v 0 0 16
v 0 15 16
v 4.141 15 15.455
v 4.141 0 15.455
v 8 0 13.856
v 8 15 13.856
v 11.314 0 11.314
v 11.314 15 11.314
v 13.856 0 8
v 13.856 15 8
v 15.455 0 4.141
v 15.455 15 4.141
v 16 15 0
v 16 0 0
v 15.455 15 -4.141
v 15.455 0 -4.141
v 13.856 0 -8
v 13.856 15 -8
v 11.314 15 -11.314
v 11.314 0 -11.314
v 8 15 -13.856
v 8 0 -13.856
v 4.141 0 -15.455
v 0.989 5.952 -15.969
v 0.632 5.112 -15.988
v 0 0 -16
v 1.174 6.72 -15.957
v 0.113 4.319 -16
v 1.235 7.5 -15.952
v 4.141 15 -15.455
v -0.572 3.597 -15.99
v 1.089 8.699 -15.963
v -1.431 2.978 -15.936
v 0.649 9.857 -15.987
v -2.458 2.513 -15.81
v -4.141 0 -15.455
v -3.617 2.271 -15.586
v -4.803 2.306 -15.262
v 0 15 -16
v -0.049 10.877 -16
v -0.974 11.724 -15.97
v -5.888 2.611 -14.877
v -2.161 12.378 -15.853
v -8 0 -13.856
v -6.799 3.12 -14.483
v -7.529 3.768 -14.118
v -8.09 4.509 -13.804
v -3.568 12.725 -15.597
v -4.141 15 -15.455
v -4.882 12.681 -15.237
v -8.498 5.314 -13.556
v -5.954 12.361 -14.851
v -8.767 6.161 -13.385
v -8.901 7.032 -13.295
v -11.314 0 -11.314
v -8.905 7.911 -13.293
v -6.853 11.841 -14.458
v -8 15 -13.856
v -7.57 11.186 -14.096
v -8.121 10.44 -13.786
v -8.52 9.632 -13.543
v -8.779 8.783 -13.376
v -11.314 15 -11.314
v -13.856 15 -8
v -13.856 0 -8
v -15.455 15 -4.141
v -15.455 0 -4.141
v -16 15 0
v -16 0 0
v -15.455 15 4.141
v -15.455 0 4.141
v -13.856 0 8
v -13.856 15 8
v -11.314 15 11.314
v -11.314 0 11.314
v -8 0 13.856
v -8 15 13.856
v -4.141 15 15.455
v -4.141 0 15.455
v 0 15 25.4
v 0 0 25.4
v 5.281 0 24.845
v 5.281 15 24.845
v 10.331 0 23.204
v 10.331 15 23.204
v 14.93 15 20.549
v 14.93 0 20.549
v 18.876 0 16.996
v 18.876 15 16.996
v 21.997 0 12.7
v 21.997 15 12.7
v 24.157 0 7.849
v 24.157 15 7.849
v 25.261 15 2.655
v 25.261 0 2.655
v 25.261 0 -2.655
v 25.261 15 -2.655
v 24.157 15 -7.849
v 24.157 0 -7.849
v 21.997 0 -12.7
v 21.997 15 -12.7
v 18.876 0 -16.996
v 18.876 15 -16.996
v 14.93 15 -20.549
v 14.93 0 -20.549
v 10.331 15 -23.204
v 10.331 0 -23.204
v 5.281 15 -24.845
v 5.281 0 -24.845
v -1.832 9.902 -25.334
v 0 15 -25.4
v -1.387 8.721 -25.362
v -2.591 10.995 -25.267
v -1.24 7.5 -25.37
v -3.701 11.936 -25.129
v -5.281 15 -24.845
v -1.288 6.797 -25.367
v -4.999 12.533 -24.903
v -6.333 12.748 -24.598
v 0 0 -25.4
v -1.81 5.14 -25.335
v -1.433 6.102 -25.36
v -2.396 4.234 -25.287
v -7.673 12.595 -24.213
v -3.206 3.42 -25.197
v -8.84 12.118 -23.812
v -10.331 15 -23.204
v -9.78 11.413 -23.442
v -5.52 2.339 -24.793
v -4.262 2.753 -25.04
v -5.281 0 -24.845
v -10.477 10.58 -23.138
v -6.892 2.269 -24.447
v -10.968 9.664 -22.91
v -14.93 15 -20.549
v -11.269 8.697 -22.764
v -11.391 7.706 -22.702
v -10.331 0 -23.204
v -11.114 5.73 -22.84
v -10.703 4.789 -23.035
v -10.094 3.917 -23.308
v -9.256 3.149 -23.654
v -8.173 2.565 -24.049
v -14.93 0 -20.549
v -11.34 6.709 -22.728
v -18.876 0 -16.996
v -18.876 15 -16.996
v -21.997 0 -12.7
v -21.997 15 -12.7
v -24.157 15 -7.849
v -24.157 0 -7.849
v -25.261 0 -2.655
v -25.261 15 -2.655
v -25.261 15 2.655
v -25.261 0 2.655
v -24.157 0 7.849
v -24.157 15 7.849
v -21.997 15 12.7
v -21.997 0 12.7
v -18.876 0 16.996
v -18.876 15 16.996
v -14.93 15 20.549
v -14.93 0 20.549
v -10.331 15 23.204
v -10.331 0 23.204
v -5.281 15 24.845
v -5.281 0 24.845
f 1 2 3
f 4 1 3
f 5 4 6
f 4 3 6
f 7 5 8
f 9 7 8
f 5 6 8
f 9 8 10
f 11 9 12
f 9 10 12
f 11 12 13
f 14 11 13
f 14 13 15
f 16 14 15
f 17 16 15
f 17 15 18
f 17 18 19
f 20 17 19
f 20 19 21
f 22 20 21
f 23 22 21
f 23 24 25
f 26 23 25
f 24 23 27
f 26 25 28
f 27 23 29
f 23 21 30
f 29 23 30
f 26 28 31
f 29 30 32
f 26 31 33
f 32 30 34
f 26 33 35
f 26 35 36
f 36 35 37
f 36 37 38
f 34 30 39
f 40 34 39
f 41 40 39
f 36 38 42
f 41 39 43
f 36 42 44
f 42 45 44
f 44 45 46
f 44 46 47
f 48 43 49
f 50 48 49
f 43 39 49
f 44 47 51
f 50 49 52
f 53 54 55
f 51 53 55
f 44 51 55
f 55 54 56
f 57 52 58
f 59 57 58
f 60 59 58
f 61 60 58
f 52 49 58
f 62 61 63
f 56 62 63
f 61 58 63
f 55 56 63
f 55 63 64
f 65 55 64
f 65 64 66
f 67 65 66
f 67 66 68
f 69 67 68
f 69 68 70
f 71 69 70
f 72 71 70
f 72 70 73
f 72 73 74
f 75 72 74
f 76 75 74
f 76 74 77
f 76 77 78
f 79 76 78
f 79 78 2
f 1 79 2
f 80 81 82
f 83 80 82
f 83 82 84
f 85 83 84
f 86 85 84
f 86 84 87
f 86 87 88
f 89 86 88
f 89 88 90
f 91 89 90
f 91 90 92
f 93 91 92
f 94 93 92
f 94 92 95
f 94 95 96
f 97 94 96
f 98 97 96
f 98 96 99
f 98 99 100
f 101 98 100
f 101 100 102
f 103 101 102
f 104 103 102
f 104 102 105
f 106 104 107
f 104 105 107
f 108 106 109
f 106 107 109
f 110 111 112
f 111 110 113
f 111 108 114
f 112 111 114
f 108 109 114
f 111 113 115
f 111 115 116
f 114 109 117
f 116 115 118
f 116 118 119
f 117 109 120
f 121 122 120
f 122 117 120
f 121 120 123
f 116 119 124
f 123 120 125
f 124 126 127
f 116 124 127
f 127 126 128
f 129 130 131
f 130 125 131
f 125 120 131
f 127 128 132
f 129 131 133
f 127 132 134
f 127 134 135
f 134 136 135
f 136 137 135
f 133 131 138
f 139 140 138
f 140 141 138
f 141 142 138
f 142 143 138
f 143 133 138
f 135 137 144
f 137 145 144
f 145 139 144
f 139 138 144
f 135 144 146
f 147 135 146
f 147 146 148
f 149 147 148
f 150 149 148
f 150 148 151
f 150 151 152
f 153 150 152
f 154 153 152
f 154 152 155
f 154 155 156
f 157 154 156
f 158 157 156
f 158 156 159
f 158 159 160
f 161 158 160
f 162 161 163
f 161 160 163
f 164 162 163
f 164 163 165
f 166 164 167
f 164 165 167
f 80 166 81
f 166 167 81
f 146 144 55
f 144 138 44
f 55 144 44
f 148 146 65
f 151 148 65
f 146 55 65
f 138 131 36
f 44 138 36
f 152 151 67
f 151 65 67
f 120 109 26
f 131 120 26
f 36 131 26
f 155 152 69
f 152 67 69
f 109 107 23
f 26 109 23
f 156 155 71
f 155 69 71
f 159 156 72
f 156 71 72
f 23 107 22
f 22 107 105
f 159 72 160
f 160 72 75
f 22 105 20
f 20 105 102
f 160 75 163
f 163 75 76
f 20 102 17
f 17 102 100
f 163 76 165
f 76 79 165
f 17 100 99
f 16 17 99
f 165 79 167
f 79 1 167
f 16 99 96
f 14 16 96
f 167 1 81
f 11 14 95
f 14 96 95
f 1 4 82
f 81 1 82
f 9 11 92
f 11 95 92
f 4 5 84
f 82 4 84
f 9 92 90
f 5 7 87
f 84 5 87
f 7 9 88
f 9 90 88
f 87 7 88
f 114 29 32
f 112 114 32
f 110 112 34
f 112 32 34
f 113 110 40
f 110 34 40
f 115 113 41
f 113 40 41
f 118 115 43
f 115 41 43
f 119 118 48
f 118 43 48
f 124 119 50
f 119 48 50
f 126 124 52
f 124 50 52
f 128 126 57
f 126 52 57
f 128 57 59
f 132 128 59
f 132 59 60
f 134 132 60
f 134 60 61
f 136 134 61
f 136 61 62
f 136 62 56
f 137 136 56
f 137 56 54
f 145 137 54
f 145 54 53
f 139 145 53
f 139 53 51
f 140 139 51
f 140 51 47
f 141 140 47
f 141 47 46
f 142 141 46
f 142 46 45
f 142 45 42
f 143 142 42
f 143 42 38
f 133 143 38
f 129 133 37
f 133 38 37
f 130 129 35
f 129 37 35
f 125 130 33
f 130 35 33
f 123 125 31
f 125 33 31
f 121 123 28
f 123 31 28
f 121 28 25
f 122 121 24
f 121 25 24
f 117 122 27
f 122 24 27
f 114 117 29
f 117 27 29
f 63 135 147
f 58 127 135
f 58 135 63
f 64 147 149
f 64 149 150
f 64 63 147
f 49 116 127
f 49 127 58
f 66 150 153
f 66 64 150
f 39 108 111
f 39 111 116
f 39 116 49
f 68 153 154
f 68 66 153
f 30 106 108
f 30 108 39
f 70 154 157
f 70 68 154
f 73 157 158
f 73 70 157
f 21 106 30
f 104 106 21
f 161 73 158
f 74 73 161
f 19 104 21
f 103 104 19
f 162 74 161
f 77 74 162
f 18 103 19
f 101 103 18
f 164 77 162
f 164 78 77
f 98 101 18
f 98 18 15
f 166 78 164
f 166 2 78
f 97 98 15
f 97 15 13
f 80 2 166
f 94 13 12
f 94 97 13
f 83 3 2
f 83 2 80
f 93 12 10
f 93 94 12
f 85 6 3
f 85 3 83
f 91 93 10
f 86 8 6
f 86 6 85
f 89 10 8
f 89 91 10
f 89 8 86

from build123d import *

# Parameters (mm, degrees)
SKETCH1_R                        = 25.4
BOSS_EXTRUDE1_DEPTH              = 15
SKETCH2_R                        = 16
CUT_EXTRUDE1_DEPTH               = 15
F_10_5_10_5_DIAMETER_HOLE1_D     = 10.5
F_10_5_10_5_DIAMETER_HOLE1_DEPTH = 30
F_10_5_10_5_DIAMETER_HOLE1_TIP   = 3.15451825


with BuildPart() as part:
    # Sketch1 → Boss-Extrude1 (new body)
    with BuildSketch(Plane(origin=(0, 0, 0), x_dir=(1, 0, 0), z_dir=(0, 1, 0))):
        with Locations(Location((0, 0, 0), (0, 0, 270))):
            Circle(SKETCH1_R)
    extrude(amount=BOSS_EXTRUDE1_DEPTH)

    # Sketch2 → Cut-Extrude1 (cut)
    with BuildSketch(Plane(origin=(0, 15, 0), x_dir=(1, 0, 0), z_dir=(0, 1, 0))):
        with Locations(Location((0, 0, 0), (0, 0, 270))):
            Circle(SKETCH2_R)
    extrude(amount=-CUT_EXTRUDE1_DEPTH, mode=Mode.SUBTRACT)

    # Ø10.5 (10.5) Diameter Hole1
    with Locations(Plane(origin=(-6.456859903, 7.5, -24.565605228), x_dir=(-0.967149812109, 0, 0.254207082784), z_dir=(-0.254207082784, 0, -0.967149812109))):
        with Locations((0, 0)):
            Hole(F_10_5_10_5_DIAMETER_HOLE1_D / 2, depth=F_10_5_10_5_DIAMETER_HOLE1_DEPTH)
            with Locations((0, 0, -(F_10_5_10_5_DIAMETER_HOLE1_DEPTH + F_10_5_10_5_DIAMETER_HOLE1_TIP / 2))):  # 118° drill point
                Cone(0, F_10_5_10_5_DIAMETER_HOLE1_D / 2, F_10_5_10_5_DIAMETER_HOLE1_TIP, mode=Mode.SUBTRACT)


solid = part.part
